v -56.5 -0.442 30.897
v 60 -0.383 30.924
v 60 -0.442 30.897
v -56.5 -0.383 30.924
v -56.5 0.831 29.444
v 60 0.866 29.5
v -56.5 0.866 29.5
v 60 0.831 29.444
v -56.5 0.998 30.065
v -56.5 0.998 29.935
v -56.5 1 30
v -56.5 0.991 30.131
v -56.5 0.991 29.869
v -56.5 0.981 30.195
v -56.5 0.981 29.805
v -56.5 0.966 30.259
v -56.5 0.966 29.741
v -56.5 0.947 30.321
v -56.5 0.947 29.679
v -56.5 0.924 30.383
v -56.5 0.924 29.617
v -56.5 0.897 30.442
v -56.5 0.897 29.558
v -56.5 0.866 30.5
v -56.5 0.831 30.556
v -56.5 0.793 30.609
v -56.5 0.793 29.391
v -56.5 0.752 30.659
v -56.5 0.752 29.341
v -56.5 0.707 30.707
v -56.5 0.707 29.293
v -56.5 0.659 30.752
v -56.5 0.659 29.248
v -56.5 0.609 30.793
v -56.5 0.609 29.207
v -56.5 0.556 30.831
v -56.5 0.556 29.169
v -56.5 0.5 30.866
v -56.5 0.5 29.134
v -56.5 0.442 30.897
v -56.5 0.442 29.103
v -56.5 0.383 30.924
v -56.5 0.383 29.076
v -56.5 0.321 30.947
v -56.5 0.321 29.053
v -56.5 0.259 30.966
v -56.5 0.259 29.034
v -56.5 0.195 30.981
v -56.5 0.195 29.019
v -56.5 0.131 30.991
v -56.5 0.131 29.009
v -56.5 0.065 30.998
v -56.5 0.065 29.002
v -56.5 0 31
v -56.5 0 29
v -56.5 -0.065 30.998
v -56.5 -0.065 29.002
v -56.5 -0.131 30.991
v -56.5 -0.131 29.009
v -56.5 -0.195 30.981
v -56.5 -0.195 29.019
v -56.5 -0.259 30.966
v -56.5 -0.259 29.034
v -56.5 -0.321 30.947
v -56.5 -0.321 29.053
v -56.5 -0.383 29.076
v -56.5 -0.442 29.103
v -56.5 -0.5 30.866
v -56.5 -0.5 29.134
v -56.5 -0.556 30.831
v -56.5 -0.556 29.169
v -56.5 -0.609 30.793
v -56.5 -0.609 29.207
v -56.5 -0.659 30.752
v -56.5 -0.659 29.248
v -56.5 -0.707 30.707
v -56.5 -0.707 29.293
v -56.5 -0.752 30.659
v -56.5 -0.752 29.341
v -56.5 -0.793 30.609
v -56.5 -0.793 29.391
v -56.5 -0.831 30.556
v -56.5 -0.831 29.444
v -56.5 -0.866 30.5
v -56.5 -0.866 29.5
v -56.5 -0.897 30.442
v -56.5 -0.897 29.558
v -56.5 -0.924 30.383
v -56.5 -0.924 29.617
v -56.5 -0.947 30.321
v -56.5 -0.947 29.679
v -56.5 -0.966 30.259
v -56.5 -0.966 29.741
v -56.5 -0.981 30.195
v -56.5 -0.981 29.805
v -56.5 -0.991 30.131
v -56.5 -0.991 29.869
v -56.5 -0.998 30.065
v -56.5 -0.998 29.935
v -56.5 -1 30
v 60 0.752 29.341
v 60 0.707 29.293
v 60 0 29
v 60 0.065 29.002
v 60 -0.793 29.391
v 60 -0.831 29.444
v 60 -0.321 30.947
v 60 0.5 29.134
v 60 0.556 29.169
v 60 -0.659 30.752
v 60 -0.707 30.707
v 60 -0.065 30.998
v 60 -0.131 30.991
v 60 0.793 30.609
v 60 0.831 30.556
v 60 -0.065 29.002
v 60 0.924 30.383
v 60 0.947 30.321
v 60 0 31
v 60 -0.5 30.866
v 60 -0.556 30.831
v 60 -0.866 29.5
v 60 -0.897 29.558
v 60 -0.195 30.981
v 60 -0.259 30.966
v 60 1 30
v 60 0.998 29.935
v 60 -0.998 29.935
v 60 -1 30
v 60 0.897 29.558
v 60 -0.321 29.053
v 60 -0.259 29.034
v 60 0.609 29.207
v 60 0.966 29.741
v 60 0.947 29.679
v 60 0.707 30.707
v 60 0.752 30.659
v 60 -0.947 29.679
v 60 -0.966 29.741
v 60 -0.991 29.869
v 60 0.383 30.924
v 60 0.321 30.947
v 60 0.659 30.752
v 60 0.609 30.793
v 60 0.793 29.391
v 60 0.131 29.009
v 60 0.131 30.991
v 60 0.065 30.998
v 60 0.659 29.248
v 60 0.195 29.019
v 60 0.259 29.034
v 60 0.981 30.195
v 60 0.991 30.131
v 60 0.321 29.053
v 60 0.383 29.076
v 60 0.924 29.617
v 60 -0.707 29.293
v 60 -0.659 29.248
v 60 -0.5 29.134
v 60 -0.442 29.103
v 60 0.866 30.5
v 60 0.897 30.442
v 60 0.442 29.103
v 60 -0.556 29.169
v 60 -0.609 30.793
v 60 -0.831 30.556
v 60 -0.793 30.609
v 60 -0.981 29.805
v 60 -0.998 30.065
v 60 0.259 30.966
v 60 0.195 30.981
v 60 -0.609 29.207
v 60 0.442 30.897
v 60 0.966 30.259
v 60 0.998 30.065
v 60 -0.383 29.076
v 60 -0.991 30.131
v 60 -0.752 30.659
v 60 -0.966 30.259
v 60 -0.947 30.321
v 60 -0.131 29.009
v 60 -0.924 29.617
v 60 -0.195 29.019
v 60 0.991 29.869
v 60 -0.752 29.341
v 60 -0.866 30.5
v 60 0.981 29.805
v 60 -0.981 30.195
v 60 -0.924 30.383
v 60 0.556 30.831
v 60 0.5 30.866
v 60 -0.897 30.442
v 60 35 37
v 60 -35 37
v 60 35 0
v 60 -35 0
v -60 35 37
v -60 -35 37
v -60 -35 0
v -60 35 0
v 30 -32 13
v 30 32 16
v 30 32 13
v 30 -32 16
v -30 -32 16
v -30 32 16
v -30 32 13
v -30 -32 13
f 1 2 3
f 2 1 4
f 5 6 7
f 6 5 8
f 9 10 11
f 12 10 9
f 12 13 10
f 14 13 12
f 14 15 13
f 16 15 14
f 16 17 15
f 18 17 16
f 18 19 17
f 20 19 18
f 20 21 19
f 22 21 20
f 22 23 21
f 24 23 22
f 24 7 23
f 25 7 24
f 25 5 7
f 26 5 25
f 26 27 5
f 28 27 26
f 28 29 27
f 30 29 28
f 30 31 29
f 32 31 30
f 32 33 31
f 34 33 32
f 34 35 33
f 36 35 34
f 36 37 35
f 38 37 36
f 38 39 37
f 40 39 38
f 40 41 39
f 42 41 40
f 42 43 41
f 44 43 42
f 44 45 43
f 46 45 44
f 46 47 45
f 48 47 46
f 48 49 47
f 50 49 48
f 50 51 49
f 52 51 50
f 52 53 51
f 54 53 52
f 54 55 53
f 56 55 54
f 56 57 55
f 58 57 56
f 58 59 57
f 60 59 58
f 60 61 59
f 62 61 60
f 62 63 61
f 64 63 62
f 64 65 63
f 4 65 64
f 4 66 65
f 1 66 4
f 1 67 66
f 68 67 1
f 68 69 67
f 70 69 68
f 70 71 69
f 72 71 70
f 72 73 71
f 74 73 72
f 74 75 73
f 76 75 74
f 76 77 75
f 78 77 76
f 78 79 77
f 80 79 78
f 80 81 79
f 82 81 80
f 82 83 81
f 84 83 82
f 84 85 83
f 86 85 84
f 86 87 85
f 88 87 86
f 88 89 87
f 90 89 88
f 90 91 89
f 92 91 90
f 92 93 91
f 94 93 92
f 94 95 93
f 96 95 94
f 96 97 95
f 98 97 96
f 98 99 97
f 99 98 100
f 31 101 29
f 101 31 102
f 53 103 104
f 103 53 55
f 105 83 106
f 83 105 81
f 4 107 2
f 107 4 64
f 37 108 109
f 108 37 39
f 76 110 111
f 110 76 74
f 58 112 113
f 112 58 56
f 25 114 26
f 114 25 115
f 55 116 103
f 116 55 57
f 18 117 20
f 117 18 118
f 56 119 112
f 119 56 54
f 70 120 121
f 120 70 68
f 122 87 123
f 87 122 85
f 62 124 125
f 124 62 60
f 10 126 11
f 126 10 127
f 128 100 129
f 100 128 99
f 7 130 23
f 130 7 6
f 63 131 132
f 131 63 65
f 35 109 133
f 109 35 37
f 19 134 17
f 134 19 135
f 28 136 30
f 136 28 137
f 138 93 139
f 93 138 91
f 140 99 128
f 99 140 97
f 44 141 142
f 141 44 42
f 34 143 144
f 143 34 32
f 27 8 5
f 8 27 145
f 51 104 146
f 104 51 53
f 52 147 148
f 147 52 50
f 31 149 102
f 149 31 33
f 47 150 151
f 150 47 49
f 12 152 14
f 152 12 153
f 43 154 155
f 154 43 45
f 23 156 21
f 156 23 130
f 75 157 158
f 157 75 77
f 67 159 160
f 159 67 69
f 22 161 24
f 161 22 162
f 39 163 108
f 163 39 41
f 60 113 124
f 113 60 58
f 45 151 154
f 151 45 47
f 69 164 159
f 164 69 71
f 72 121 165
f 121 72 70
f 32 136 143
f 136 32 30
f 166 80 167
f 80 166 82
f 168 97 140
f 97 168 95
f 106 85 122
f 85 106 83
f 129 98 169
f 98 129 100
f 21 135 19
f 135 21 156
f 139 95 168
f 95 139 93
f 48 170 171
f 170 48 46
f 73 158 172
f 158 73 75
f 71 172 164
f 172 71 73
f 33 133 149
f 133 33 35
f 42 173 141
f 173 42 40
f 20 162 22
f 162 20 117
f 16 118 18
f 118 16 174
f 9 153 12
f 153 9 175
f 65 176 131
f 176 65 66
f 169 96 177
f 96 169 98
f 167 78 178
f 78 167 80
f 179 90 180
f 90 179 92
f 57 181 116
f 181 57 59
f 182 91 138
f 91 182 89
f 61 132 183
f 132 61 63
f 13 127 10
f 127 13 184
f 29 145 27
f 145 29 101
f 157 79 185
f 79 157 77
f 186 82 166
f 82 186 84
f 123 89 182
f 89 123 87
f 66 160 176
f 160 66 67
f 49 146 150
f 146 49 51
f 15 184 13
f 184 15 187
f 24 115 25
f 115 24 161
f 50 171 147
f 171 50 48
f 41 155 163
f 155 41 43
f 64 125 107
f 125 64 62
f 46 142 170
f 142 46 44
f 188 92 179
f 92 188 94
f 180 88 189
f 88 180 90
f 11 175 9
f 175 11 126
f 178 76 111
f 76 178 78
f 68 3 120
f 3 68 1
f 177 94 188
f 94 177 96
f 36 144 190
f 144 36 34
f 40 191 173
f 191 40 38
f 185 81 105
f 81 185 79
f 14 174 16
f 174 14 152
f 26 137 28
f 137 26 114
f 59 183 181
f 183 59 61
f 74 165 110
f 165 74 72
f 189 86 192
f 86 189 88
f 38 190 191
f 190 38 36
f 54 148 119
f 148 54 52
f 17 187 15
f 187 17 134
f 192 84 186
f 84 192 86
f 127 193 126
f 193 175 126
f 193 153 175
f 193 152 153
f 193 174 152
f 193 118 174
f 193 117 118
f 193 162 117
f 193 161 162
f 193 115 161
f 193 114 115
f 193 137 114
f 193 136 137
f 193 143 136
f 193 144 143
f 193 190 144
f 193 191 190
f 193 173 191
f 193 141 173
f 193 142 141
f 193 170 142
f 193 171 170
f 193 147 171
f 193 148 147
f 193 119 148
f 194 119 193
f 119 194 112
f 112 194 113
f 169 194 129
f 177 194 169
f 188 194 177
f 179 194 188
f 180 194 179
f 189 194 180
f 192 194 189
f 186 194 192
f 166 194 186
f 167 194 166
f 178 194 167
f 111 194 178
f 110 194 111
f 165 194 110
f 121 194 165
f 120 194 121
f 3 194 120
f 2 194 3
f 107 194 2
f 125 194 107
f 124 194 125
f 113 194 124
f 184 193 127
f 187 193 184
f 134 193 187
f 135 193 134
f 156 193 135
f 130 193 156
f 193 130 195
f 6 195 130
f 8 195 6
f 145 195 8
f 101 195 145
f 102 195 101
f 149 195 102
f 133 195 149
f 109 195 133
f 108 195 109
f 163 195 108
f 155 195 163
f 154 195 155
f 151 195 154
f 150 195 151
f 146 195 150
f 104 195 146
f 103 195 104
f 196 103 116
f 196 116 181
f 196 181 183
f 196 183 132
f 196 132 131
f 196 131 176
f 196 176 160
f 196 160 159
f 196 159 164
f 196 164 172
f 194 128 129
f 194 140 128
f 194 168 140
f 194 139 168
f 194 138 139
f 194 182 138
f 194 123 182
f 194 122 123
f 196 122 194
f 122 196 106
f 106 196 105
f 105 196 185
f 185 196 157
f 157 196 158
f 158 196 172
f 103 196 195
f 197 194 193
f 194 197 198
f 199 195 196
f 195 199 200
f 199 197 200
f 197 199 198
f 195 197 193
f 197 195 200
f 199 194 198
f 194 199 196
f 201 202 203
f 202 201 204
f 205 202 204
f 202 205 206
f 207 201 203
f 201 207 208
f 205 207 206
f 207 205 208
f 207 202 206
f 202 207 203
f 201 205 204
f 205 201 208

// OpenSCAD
// Mini horizontal gel-electrophoresis buffer tank
// Print orientation: open top facing up (+Z), resting on XY plane at z = 0

// ---------------- Parameters ----------------
tank_x      = 120;   // outer length in X (mm)
tank_y      = 70;    // outer width in Y (mm)
tank_z      = 40;    // outer height in Z (mm)
wall        = 3;     // wall thickness (mm)
floor       = 3;     // floor thickness (mm)

platform_x  = 60;    // platform length in X (mm), centred
platform_z  = 13;    // platform top height above inner floor (mm) -> z = 16

hole_d      = 2;     // electrode wire hole diameter (mm)
hole_y      = 0;     // hole centre Y (mm)
hole_z      = 30;    // hole centre Z (mm)

eps         = 0.5;   // cutter overshoot past faces (mm)
$fn         = 96;    // curve resolution

// ---------------- Derived ----------------
inner_x = tank_x - 2 * wall;   // 114
inner_y = tank_y - 2 * wall;   // 64
inner_z = tank_z - floor;      // 37

// ---------------- Model ----------------
difference() {
    // Tank body (open top)
    translate([-tank_x / 2, -tank_y / 2, 0])
        cube([tank_x, tank_y, tank_z - wall]);

    // Raised gel-tray platform, full inner width
    translate([-platform_x / 2, -inner_y / 2, platform_z])
        cube([platform_x, inner_y, wall]);

    // Horizontal electrode holes through each end wall along X
    for (sx = [-1, 1])
        translate([sx * (inner_x / 2 - eps), hole_y, hole_z])
            rotate([0, 90, 0])
                cylinder(d = hole_d, h = tank_x + 2 * eps);
}
